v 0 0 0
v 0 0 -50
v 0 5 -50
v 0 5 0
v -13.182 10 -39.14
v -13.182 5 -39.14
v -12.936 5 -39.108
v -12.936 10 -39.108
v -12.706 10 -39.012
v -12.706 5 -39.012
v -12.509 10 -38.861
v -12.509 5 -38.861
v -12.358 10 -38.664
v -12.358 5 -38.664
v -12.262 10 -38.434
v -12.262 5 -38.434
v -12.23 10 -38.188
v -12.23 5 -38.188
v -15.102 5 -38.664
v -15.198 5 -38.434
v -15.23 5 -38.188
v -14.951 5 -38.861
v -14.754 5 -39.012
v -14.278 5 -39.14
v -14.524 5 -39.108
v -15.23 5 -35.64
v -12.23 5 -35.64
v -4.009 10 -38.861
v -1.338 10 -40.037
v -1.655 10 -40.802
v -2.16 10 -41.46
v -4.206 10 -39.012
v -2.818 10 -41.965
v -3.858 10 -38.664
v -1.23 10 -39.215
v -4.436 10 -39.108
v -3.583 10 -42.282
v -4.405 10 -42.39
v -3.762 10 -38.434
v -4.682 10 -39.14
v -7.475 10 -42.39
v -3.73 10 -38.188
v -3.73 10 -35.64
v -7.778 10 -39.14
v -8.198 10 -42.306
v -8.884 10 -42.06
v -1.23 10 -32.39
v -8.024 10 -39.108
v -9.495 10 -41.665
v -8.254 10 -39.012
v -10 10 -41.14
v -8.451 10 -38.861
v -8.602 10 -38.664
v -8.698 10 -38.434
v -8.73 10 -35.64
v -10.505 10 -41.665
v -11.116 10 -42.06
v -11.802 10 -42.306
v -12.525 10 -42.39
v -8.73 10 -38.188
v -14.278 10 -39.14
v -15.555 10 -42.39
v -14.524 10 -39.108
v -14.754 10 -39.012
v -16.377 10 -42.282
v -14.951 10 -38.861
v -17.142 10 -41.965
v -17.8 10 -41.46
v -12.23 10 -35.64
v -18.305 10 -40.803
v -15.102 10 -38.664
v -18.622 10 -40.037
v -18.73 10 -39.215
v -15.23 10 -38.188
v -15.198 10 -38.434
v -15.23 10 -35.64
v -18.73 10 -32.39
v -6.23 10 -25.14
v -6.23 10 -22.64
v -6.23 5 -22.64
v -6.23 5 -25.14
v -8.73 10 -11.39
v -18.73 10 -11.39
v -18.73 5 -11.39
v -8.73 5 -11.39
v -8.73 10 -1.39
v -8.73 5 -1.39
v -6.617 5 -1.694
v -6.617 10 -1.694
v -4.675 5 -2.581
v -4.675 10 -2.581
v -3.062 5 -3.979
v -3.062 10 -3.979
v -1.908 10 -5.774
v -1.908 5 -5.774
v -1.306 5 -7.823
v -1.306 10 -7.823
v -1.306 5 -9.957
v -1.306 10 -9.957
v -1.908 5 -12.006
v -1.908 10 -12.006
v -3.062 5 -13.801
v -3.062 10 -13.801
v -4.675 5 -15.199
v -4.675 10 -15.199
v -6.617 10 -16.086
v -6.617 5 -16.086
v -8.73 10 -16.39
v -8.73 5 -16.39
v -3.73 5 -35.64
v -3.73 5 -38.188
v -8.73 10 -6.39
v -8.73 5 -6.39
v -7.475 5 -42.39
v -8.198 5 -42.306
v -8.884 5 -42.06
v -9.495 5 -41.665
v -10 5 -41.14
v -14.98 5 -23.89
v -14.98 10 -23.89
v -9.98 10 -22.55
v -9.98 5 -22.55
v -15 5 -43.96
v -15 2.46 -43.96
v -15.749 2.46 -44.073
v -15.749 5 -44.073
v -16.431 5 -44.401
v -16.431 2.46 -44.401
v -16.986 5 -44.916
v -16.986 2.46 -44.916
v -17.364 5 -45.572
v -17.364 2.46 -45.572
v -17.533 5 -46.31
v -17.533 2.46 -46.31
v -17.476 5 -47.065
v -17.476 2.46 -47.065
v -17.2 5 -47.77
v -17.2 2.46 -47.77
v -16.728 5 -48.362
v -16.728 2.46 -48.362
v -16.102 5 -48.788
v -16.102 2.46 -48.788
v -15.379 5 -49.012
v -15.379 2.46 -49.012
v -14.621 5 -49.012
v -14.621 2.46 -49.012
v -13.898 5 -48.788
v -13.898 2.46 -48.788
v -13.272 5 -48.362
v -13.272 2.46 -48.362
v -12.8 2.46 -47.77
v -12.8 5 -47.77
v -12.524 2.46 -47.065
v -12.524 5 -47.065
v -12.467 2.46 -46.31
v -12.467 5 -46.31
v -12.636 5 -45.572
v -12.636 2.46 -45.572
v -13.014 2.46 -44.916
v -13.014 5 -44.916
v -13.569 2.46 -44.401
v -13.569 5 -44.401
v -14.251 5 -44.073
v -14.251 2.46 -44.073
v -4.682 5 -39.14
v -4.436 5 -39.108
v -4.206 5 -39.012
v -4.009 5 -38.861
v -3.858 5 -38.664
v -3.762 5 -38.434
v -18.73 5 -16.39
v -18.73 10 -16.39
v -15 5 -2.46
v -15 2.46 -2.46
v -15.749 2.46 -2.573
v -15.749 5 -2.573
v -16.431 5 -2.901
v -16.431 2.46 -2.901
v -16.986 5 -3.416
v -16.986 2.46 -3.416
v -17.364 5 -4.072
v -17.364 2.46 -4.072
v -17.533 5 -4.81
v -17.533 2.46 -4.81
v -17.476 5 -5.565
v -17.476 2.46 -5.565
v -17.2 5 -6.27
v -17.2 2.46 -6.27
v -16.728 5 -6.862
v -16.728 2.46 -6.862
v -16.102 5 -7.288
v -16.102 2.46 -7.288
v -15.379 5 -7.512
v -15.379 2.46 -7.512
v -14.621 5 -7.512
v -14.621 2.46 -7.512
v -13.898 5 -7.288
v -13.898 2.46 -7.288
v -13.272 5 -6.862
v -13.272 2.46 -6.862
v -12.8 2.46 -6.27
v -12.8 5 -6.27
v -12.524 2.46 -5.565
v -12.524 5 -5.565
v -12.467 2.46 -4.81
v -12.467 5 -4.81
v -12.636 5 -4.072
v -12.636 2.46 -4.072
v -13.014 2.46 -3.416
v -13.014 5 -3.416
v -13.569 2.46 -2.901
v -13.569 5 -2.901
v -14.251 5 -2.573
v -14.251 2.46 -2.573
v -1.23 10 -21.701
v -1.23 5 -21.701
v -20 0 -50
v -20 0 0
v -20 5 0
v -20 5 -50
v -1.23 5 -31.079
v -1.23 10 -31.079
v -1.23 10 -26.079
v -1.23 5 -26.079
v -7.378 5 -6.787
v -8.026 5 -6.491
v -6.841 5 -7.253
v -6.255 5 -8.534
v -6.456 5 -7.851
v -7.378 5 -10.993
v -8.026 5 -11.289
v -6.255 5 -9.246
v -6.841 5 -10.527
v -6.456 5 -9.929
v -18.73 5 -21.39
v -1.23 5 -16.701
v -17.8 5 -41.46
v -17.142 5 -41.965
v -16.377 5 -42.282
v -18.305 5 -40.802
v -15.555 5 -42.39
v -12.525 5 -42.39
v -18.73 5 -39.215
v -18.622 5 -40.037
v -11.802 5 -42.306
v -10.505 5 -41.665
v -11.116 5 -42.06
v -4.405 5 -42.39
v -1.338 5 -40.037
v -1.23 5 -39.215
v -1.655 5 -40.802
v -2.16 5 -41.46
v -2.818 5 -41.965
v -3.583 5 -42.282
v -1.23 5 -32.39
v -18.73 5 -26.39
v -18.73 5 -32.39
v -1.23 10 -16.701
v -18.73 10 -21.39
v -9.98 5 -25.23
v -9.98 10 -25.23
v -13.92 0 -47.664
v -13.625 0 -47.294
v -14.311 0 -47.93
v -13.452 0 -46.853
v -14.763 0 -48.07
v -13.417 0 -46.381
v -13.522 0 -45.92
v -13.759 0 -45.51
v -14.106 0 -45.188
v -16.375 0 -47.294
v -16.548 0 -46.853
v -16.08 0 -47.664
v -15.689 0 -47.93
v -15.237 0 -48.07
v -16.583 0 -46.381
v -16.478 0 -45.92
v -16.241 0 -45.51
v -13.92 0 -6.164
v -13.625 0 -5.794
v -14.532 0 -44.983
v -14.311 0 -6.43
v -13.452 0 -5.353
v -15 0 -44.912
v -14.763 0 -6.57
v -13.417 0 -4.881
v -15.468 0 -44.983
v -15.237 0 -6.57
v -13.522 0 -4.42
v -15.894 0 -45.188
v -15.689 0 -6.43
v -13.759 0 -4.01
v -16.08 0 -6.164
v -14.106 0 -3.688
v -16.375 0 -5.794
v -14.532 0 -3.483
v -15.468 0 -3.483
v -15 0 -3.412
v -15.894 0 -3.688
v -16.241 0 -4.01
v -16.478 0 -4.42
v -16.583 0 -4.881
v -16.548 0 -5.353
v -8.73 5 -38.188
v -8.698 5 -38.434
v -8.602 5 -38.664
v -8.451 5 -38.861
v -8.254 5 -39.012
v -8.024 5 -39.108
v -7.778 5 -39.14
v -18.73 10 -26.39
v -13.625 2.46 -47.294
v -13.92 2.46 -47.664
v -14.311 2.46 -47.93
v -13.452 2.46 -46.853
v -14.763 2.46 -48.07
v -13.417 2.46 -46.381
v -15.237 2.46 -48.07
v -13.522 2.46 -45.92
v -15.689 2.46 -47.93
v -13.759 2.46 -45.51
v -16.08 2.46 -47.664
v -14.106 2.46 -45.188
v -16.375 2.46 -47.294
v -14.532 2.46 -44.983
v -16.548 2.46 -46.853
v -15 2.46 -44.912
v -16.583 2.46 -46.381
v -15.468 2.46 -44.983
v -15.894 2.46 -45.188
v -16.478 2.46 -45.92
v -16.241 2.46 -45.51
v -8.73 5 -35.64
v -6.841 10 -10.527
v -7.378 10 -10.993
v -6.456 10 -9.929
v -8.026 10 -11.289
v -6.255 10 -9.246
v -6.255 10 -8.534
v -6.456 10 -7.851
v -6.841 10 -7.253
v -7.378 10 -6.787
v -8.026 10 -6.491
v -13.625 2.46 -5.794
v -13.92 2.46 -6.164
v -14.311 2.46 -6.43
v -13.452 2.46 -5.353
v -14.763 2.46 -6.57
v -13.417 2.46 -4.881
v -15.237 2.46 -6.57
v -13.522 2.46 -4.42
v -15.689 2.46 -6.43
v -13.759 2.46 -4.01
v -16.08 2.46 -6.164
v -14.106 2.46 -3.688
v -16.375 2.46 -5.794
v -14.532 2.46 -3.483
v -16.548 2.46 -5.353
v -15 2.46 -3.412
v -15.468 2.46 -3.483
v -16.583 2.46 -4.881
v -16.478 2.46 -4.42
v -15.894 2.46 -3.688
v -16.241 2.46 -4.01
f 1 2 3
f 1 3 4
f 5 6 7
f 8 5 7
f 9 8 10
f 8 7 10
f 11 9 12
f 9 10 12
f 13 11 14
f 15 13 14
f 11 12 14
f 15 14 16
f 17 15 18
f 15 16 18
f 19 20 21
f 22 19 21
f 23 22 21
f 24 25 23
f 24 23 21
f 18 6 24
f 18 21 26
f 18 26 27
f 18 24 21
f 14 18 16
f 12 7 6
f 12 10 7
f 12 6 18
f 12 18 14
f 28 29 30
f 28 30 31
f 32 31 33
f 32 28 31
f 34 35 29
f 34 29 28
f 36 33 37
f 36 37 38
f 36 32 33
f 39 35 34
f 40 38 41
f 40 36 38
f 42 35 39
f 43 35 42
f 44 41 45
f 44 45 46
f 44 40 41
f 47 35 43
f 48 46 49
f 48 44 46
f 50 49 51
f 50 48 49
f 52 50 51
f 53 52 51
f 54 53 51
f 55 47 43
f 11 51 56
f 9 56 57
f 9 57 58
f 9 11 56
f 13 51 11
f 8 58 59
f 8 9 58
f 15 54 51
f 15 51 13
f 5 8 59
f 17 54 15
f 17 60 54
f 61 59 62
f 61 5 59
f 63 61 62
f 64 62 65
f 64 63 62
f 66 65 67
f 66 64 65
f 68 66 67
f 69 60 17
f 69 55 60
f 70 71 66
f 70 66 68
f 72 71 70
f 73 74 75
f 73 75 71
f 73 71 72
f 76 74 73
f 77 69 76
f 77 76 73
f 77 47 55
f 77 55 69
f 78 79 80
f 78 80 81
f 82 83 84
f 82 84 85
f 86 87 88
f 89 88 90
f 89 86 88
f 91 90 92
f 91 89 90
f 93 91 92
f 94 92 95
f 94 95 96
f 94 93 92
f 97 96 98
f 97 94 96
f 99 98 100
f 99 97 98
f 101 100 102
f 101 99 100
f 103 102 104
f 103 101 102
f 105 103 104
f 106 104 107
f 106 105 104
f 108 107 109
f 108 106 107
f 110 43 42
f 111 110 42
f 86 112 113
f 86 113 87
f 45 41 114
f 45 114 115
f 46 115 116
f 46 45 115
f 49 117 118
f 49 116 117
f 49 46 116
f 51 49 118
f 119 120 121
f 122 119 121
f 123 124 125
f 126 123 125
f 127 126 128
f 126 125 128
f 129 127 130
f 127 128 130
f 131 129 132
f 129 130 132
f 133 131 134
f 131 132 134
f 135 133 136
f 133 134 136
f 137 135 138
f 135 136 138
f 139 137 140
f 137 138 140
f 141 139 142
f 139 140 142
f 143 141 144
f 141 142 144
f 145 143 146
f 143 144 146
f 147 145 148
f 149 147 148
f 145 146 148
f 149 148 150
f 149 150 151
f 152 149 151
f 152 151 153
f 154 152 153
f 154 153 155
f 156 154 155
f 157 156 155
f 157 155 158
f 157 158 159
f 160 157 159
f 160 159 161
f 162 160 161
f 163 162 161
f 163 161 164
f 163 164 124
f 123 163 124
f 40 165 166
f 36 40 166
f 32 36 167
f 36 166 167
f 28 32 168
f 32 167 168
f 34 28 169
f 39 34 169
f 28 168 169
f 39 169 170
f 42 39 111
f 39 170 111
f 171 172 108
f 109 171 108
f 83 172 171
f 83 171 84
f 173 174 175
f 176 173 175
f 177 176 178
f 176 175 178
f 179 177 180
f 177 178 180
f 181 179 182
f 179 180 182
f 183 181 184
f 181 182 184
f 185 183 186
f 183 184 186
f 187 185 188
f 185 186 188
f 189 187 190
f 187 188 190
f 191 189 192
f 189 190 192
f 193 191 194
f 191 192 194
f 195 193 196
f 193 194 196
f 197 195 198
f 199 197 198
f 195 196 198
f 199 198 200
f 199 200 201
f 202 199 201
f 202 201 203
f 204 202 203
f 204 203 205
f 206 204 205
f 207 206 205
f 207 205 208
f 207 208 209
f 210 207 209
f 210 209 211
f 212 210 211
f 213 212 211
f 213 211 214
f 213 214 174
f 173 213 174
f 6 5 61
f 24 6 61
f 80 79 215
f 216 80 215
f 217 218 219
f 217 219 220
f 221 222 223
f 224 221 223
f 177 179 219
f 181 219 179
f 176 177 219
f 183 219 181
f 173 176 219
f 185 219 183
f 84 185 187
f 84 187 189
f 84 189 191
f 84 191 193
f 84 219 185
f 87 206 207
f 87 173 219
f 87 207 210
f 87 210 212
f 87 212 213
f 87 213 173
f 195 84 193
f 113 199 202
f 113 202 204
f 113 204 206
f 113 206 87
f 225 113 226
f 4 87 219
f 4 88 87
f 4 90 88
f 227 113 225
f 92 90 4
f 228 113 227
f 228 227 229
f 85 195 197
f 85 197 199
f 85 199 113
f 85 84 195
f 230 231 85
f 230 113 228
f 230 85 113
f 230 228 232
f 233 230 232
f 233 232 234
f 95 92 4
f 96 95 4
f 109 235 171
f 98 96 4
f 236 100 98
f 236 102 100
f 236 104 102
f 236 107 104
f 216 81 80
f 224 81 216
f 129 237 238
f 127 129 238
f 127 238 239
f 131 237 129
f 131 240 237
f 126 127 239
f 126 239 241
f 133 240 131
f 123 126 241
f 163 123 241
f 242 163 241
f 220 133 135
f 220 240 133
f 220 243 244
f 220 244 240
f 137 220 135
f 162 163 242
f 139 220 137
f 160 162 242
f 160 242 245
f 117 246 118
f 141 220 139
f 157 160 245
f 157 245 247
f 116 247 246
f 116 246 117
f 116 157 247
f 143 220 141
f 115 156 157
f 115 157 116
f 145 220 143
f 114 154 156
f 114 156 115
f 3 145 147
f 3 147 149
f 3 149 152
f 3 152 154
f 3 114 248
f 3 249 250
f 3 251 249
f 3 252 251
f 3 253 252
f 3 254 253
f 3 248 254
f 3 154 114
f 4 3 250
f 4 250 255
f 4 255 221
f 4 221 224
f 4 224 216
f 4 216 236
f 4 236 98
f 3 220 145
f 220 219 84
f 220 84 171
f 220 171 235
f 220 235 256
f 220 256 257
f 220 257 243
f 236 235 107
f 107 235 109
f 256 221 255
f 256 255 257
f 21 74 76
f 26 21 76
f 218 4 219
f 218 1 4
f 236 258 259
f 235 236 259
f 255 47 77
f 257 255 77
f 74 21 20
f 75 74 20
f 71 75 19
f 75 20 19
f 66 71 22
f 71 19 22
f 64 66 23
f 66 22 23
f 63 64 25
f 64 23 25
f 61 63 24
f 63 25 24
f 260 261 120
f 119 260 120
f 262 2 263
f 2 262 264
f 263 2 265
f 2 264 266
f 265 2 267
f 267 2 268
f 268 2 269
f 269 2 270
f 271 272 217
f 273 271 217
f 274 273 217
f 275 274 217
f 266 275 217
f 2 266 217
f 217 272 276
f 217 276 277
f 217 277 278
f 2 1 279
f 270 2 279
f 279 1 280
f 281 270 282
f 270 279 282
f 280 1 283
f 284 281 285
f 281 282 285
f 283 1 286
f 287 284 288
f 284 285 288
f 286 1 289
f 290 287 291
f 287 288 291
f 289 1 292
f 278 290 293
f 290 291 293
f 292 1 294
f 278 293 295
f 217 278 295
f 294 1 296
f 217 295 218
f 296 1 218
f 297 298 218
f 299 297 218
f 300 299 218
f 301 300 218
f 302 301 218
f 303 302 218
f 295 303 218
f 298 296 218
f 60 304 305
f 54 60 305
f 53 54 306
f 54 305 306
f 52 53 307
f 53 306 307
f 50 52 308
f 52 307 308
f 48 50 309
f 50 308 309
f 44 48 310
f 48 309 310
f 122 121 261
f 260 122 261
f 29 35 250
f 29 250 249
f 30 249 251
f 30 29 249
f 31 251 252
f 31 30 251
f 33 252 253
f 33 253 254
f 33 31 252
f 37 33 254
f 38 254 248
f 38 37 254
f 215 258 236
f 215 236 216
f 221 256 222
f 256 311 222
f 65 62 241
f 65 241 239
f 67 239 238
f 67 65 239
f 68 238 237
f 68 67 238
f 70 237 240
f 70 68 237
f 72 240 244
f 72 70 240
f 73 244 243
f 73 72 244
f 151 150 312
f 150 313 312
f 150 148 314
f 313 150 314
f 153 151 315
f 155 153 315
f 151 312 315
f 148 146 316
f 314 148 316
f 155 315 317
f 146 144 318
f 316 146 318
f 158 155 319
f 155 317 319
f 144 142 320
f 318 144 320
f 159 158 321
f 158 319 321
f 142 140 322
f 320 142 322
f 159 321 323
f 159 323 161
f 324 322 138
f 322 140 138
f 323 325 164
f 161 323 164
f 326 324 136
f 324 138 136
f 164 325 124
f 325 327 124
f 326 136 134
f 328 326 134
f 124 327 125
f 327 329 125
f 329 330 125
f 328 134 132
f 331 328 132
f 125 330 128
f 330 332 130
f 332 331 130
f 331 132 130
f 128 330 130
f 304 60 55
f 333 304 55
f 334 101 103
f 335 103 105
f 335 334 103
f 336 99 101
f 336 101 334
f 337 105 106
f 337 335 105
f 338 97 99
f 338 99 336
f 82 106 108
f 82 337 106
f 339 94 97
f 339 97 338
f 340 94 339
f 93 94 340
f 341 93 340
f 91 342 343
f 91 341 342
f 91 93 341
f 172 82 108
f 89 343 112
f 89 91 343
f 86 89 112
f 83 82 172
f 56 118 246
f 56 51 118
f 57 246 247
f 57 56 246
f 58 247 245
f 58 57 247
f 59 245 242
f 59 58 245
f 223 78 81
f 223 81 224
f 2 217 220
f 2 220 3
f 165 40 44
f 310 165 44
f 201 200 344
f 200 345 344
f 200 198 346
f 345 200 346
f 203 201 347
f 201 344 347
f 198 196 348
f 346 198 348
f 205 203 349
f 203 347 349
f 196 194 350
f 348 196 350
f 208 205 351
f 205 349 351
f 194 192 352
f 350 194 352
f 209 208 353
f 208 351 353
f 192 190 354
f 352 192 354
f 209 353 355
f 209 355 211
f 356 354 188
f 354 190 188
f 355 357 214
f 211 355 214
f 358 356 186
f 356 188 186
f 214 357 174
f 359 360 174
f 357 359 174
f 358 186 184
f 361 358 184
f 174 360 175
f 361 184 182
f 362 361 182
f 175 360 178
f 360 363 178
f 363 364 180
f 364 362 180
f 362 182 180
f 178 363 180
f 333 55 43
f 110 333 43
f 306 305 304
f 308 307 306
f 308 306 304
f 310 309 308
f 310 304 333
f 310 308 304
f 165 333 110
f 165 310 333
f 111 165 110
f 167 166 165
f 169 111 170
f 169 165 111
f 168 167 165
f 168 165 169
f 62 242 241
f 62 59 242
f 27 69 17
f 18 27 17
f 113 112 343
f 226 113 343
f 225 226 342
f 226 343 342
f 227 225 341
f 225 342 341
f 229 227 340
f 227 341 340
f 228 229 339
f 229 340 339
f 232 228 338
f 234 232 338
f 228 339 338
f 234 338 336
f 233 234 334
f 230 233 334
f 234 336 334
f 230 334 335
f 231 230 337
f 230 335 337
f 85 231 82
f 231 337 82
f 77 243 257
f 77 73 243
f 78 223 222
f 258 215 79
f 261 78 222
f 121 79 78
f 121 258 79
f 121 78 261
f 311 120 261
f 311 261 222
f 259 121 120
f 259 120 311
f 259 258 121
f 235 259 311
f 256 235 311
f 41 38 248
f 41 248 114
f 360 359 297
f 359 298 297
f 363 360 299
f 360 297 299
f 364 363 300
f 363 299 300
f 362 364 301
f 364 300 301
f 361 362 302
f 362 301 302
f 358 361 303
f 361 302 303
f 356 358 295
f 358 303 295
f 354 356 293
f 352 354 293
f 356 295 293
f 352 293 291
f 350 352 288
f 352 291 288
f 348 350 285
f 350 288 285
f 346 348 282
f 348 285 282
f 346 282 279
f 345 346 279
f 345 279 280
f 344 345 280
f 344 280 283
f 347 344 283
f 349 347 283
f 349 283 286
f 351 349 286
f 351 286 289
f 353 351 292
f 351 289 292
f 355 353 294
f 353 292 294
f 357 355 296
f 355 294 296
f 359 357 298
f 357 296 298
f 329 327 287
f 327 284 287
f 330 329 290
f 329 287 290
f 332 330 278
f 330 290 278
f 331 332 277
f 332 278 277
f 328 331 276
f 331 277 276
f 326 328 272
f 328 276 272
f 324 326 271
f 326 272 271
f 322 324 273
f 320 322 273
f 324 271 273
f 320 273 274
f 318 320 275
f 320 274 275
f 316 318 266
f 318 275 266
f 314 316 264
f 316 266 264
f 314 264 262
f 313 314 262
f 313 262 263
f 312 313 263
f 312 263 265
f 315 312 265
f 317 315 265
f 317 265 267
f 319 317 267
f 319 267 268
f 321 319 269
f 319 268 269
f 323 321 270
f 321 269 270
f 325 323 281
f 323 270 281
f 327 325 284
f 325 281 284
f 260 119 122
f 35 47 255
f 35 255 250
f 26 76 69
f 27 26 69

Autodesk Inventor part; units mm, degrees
ref_plane "YZ Plane" through (0, 0, 0) normal (1, 0, 0) x (0, 1, 0)
ref_plane "XZ Plane" through (0, 0, 0) normal (0, 1, 0) x (-1, 0, 0)
ref_plane "XY Plane" through (0, 0, 0) normal (0, 0, 1) x (1, 0, 0)
sketch "Sketch1" plane through (0, 0, 0) normal (0, 1, 0) x (-1, 0, 0)
  line L0 (0, 0) -> (20, 0)
  line L1 (20, 0) -> (20, -50)
  line L2 (20, -50) -> (0, -50)
  line L3 (0, -50) -> (0, 0)
  dimension "d0" = 50
  dimension "d1" = 20
extrude "Extrusion1" add sketch "Sketch1" along normal blind 10
sketch "Sketch4" plane through (0, 10, 0) normal (0, 1, 0) x (1, 0, 0)
  line L0 (-18.73, 16.39) -> (-18.73, 11.39)
  line L1 (-18.73, 11.39) -> (-8.73, 11.39)
  line L2 (-8.73, 11.39) -> (-8.73, 6.39) construction
  line L3 (-18.73, 16.39) -> (-8.73, 16.39)
  arc A0 (-8.73, 6.39) -> (-8.73, 11.39) centre (-8.73, 8.89) ccw
  line L4 (-8.73, 6.39) -> (-8.73, 1.39)
  arc A1 (-15.8011, 11.39) -> (-8.73, 1.39) centre (-8.73, 8.89) ccw construction
  line L5 (-20, 0) -> (0, 0) construction
  line L6 (0, 0) -> (0, 50) construction
  line L7 (0, 50) -> (-20, 50) construction
  line L8 (-20, 50) -> (-20, 0) construction
  line L9 (-20, 0) -> (0, 0) projected
  line L10 (-10, 0) -> (-10, 50) construction
  arc A2 (-10, 16.2817) -> (-15.8011, 11.39) centre (-8.73, 8.89) ccw construction
  arc A3 (-8.73, 1.39) -> (-10, 16.2817) centre (-8.73, 8.89) ccw
  arc A4 (-10, 6.7366) -> (-8.73, 6.39) centre (-8.73, 8.89) ccw construction
  arc A5 (-8.73, 11.39) -> (-10, 6.7366) centre (-8.73, 8.89) ccw construction
  line L11 (-1.23, 8.89) -> (-1.23, 50) construction
  line L12 (-1.23, 16.7009) -> (-18.73, 21.39)
  line L13 (-18.73, 21.39) -> (-18.73, 26.39)
  line L14 (-18.73, 26.39) -> (-1.23, 31.0791)
  line L15 (-1.23, 32.39) -> (-18.73, 32.39)
  line L16 (-1.23, 16.7009) -> (-1.23, 21.7009)
  line L17 (-6.23, 22.64) -> (-1.23, 21.7009)
  line L18 (-6.23, 22.64) -> (-6.23, 25.14)
  line L19 (-6.23, 25.14) -> (-1.23, 26.0791)
  line L20 (-1.23, 31.0791) -> (-1.23, 26.0791)
  line L21 (-18.73, 23.89) -> (-1.23, 23.89) construction
  line L22 (-14.98, 23.89) -> (-9.98, 22.5503)
  line L23 (-9.98, 22.5503) -> (-9.98, 25.2297)
  line L24 (-9.98, 25.2297) -> (-14.98, 23.89)
  line L25 (-1.23, 32.39) -> (-1.23, 42.39)
  line L26 (-1.23, 42.39) -> (-9.375, 42.39)
  line L27 (-10, 42.39) -> (-10, 42.39)
  line L28 (-10, 42.39) -> (-10.625, 42.39)
  line L29 (-18.73, 42.39) -> (-18.73, 32.39)
  line L30 (-8.73, 35.64) -> (-3.73, 35.64)
  line L31 (-3.73, 35.64) -> (-3.73, 39.14)
  line L32 (-3.73, 39.14) -> (-8.73, 39.14)
  line L33 (-8.73, 39.14) -> (-8.73, 35.64)
  line L34 (-6.23, 32.39) -> (-6.23, 42.39) construction
  line L35 (-6.23, 37.39) -> (-1.23, 37.39) construction
  line L36 (-6.23, 37.39) -> (-10, 37.39) construction
  line L37 (-15.23, 35.64) -> (-12.23, 35.64)
  line L38 (-12.23, 35.64) -> (-12.23, 39.14)
  line L39 (-12.23, 39.14) -> (-15.23, 39.14)
  line L40 (-15.23, 39.14) -> (-15.23, 35.64)
  line L41 (-12.23, 37.39) -> (-10, 37.39) construction
  line L42 (-20, 50) -> (-20, 0) projected
  line L43 (-20, 0) -> (-20, 50)
  line L44 (0, 50) -> (-20, 50) projected
  line L45 (-20, 50) -> (0, 50)
  line L46 (0, 50) -> (0, 0)
  line L47 (-10.625, 42.39) -> (-10, 41.14)
  line L48 (-10, 41.14) -> (-9.375, 42.39)
  line L49 (-10, 42.39) -> (-10.625, 42.39)
  line L50 (-10, 42.39) -> (-9.375, 42.39)
  line L51 (-10.625, 42.39) -> (-18.73, 42.39)
  line L52 (-9.375, 42.39) -> (-10, 42.39)
  point P0 (-6.23, 23.89)
  point P1 (-9.98, 23.89)
  point P2 (-6.23, 39.14)
  point P3 (-8.73, 37.39)
  dimension "d11" = 5
  dimension "d12" = 10
  dimension "d14" = 5
  dimension "d16" = 10
  dimension "d17" = 1.27
  dimension "d18" = 8.89
  dimension "d19" = 75
  dimension "d20" = 75
  dimension "d21" = 5
  dimension "d22" = 2.5
  dimension "d23" = 15
  dimension "d24" = 5
  dimension "d25" = 5
  dimension "d26" = 8.5
  dimension "d27" = 10
  dimension "d28" = 10
  dimension "d29" = 5
  dimension "d34" = 3.5
  dimension "d35" = 1.25
  dimension "d36" = 1.25
  dimension "d39" = 2.5
  dimension "d40" = 3.5
  dimension "d41" = 3.5
extrude "Extrusion3" cut sketch "Sketch4" against normal blind 5 contours L42 L44 L46 L9 | L48 L47 L28 L50 | L24 L23 L22 | L33 L32 L31 L30 | L40 L39 L38 L37
fillet "Fillet1" radius 3.175 4 edges at (-18.73, 7.5, -42.39) (-10.625, 7.5, -42.39) (-9.375, 7.5, -42.39) (-1.23, 7.5, -42.39)
sketch "Sketch5" plane through (0, 5, 0) normal (0, 1, 0) x (1, 0, 0)
  line L0 (-20, 50) -> (0, 50) projected
  line L1 (-20, 0) -> (-20, 50) projected
  line L2 (0, 0) -> (-20, 0) projected
  point P0 (-15, 5)
  point P1 (-15, 46.5)
  dimension "d43" = 3.5
  dimension "d44" = 5
  dimension "d45" = 5
  dimension "d46" = 5
hole "Hole1" at (-15, 5, -5) at (-15, 5, -46.5) direction (0, -1, 0) diameter 3.175 end through all counterbore diameter 5.08 counterbore depth 2.54
fillet "Fillet2" radius 0.9525 4 edges at (-8.73, 7.5, -39.14) (-3.73, 7.5, -39.14) (-12.23, 7.5, -39.14) (-15.23, 7.5, -39.14)
equation "\"d20\" = d19"
equation "\"d22\" = 0.5 * d21"
properties part number "initials"
